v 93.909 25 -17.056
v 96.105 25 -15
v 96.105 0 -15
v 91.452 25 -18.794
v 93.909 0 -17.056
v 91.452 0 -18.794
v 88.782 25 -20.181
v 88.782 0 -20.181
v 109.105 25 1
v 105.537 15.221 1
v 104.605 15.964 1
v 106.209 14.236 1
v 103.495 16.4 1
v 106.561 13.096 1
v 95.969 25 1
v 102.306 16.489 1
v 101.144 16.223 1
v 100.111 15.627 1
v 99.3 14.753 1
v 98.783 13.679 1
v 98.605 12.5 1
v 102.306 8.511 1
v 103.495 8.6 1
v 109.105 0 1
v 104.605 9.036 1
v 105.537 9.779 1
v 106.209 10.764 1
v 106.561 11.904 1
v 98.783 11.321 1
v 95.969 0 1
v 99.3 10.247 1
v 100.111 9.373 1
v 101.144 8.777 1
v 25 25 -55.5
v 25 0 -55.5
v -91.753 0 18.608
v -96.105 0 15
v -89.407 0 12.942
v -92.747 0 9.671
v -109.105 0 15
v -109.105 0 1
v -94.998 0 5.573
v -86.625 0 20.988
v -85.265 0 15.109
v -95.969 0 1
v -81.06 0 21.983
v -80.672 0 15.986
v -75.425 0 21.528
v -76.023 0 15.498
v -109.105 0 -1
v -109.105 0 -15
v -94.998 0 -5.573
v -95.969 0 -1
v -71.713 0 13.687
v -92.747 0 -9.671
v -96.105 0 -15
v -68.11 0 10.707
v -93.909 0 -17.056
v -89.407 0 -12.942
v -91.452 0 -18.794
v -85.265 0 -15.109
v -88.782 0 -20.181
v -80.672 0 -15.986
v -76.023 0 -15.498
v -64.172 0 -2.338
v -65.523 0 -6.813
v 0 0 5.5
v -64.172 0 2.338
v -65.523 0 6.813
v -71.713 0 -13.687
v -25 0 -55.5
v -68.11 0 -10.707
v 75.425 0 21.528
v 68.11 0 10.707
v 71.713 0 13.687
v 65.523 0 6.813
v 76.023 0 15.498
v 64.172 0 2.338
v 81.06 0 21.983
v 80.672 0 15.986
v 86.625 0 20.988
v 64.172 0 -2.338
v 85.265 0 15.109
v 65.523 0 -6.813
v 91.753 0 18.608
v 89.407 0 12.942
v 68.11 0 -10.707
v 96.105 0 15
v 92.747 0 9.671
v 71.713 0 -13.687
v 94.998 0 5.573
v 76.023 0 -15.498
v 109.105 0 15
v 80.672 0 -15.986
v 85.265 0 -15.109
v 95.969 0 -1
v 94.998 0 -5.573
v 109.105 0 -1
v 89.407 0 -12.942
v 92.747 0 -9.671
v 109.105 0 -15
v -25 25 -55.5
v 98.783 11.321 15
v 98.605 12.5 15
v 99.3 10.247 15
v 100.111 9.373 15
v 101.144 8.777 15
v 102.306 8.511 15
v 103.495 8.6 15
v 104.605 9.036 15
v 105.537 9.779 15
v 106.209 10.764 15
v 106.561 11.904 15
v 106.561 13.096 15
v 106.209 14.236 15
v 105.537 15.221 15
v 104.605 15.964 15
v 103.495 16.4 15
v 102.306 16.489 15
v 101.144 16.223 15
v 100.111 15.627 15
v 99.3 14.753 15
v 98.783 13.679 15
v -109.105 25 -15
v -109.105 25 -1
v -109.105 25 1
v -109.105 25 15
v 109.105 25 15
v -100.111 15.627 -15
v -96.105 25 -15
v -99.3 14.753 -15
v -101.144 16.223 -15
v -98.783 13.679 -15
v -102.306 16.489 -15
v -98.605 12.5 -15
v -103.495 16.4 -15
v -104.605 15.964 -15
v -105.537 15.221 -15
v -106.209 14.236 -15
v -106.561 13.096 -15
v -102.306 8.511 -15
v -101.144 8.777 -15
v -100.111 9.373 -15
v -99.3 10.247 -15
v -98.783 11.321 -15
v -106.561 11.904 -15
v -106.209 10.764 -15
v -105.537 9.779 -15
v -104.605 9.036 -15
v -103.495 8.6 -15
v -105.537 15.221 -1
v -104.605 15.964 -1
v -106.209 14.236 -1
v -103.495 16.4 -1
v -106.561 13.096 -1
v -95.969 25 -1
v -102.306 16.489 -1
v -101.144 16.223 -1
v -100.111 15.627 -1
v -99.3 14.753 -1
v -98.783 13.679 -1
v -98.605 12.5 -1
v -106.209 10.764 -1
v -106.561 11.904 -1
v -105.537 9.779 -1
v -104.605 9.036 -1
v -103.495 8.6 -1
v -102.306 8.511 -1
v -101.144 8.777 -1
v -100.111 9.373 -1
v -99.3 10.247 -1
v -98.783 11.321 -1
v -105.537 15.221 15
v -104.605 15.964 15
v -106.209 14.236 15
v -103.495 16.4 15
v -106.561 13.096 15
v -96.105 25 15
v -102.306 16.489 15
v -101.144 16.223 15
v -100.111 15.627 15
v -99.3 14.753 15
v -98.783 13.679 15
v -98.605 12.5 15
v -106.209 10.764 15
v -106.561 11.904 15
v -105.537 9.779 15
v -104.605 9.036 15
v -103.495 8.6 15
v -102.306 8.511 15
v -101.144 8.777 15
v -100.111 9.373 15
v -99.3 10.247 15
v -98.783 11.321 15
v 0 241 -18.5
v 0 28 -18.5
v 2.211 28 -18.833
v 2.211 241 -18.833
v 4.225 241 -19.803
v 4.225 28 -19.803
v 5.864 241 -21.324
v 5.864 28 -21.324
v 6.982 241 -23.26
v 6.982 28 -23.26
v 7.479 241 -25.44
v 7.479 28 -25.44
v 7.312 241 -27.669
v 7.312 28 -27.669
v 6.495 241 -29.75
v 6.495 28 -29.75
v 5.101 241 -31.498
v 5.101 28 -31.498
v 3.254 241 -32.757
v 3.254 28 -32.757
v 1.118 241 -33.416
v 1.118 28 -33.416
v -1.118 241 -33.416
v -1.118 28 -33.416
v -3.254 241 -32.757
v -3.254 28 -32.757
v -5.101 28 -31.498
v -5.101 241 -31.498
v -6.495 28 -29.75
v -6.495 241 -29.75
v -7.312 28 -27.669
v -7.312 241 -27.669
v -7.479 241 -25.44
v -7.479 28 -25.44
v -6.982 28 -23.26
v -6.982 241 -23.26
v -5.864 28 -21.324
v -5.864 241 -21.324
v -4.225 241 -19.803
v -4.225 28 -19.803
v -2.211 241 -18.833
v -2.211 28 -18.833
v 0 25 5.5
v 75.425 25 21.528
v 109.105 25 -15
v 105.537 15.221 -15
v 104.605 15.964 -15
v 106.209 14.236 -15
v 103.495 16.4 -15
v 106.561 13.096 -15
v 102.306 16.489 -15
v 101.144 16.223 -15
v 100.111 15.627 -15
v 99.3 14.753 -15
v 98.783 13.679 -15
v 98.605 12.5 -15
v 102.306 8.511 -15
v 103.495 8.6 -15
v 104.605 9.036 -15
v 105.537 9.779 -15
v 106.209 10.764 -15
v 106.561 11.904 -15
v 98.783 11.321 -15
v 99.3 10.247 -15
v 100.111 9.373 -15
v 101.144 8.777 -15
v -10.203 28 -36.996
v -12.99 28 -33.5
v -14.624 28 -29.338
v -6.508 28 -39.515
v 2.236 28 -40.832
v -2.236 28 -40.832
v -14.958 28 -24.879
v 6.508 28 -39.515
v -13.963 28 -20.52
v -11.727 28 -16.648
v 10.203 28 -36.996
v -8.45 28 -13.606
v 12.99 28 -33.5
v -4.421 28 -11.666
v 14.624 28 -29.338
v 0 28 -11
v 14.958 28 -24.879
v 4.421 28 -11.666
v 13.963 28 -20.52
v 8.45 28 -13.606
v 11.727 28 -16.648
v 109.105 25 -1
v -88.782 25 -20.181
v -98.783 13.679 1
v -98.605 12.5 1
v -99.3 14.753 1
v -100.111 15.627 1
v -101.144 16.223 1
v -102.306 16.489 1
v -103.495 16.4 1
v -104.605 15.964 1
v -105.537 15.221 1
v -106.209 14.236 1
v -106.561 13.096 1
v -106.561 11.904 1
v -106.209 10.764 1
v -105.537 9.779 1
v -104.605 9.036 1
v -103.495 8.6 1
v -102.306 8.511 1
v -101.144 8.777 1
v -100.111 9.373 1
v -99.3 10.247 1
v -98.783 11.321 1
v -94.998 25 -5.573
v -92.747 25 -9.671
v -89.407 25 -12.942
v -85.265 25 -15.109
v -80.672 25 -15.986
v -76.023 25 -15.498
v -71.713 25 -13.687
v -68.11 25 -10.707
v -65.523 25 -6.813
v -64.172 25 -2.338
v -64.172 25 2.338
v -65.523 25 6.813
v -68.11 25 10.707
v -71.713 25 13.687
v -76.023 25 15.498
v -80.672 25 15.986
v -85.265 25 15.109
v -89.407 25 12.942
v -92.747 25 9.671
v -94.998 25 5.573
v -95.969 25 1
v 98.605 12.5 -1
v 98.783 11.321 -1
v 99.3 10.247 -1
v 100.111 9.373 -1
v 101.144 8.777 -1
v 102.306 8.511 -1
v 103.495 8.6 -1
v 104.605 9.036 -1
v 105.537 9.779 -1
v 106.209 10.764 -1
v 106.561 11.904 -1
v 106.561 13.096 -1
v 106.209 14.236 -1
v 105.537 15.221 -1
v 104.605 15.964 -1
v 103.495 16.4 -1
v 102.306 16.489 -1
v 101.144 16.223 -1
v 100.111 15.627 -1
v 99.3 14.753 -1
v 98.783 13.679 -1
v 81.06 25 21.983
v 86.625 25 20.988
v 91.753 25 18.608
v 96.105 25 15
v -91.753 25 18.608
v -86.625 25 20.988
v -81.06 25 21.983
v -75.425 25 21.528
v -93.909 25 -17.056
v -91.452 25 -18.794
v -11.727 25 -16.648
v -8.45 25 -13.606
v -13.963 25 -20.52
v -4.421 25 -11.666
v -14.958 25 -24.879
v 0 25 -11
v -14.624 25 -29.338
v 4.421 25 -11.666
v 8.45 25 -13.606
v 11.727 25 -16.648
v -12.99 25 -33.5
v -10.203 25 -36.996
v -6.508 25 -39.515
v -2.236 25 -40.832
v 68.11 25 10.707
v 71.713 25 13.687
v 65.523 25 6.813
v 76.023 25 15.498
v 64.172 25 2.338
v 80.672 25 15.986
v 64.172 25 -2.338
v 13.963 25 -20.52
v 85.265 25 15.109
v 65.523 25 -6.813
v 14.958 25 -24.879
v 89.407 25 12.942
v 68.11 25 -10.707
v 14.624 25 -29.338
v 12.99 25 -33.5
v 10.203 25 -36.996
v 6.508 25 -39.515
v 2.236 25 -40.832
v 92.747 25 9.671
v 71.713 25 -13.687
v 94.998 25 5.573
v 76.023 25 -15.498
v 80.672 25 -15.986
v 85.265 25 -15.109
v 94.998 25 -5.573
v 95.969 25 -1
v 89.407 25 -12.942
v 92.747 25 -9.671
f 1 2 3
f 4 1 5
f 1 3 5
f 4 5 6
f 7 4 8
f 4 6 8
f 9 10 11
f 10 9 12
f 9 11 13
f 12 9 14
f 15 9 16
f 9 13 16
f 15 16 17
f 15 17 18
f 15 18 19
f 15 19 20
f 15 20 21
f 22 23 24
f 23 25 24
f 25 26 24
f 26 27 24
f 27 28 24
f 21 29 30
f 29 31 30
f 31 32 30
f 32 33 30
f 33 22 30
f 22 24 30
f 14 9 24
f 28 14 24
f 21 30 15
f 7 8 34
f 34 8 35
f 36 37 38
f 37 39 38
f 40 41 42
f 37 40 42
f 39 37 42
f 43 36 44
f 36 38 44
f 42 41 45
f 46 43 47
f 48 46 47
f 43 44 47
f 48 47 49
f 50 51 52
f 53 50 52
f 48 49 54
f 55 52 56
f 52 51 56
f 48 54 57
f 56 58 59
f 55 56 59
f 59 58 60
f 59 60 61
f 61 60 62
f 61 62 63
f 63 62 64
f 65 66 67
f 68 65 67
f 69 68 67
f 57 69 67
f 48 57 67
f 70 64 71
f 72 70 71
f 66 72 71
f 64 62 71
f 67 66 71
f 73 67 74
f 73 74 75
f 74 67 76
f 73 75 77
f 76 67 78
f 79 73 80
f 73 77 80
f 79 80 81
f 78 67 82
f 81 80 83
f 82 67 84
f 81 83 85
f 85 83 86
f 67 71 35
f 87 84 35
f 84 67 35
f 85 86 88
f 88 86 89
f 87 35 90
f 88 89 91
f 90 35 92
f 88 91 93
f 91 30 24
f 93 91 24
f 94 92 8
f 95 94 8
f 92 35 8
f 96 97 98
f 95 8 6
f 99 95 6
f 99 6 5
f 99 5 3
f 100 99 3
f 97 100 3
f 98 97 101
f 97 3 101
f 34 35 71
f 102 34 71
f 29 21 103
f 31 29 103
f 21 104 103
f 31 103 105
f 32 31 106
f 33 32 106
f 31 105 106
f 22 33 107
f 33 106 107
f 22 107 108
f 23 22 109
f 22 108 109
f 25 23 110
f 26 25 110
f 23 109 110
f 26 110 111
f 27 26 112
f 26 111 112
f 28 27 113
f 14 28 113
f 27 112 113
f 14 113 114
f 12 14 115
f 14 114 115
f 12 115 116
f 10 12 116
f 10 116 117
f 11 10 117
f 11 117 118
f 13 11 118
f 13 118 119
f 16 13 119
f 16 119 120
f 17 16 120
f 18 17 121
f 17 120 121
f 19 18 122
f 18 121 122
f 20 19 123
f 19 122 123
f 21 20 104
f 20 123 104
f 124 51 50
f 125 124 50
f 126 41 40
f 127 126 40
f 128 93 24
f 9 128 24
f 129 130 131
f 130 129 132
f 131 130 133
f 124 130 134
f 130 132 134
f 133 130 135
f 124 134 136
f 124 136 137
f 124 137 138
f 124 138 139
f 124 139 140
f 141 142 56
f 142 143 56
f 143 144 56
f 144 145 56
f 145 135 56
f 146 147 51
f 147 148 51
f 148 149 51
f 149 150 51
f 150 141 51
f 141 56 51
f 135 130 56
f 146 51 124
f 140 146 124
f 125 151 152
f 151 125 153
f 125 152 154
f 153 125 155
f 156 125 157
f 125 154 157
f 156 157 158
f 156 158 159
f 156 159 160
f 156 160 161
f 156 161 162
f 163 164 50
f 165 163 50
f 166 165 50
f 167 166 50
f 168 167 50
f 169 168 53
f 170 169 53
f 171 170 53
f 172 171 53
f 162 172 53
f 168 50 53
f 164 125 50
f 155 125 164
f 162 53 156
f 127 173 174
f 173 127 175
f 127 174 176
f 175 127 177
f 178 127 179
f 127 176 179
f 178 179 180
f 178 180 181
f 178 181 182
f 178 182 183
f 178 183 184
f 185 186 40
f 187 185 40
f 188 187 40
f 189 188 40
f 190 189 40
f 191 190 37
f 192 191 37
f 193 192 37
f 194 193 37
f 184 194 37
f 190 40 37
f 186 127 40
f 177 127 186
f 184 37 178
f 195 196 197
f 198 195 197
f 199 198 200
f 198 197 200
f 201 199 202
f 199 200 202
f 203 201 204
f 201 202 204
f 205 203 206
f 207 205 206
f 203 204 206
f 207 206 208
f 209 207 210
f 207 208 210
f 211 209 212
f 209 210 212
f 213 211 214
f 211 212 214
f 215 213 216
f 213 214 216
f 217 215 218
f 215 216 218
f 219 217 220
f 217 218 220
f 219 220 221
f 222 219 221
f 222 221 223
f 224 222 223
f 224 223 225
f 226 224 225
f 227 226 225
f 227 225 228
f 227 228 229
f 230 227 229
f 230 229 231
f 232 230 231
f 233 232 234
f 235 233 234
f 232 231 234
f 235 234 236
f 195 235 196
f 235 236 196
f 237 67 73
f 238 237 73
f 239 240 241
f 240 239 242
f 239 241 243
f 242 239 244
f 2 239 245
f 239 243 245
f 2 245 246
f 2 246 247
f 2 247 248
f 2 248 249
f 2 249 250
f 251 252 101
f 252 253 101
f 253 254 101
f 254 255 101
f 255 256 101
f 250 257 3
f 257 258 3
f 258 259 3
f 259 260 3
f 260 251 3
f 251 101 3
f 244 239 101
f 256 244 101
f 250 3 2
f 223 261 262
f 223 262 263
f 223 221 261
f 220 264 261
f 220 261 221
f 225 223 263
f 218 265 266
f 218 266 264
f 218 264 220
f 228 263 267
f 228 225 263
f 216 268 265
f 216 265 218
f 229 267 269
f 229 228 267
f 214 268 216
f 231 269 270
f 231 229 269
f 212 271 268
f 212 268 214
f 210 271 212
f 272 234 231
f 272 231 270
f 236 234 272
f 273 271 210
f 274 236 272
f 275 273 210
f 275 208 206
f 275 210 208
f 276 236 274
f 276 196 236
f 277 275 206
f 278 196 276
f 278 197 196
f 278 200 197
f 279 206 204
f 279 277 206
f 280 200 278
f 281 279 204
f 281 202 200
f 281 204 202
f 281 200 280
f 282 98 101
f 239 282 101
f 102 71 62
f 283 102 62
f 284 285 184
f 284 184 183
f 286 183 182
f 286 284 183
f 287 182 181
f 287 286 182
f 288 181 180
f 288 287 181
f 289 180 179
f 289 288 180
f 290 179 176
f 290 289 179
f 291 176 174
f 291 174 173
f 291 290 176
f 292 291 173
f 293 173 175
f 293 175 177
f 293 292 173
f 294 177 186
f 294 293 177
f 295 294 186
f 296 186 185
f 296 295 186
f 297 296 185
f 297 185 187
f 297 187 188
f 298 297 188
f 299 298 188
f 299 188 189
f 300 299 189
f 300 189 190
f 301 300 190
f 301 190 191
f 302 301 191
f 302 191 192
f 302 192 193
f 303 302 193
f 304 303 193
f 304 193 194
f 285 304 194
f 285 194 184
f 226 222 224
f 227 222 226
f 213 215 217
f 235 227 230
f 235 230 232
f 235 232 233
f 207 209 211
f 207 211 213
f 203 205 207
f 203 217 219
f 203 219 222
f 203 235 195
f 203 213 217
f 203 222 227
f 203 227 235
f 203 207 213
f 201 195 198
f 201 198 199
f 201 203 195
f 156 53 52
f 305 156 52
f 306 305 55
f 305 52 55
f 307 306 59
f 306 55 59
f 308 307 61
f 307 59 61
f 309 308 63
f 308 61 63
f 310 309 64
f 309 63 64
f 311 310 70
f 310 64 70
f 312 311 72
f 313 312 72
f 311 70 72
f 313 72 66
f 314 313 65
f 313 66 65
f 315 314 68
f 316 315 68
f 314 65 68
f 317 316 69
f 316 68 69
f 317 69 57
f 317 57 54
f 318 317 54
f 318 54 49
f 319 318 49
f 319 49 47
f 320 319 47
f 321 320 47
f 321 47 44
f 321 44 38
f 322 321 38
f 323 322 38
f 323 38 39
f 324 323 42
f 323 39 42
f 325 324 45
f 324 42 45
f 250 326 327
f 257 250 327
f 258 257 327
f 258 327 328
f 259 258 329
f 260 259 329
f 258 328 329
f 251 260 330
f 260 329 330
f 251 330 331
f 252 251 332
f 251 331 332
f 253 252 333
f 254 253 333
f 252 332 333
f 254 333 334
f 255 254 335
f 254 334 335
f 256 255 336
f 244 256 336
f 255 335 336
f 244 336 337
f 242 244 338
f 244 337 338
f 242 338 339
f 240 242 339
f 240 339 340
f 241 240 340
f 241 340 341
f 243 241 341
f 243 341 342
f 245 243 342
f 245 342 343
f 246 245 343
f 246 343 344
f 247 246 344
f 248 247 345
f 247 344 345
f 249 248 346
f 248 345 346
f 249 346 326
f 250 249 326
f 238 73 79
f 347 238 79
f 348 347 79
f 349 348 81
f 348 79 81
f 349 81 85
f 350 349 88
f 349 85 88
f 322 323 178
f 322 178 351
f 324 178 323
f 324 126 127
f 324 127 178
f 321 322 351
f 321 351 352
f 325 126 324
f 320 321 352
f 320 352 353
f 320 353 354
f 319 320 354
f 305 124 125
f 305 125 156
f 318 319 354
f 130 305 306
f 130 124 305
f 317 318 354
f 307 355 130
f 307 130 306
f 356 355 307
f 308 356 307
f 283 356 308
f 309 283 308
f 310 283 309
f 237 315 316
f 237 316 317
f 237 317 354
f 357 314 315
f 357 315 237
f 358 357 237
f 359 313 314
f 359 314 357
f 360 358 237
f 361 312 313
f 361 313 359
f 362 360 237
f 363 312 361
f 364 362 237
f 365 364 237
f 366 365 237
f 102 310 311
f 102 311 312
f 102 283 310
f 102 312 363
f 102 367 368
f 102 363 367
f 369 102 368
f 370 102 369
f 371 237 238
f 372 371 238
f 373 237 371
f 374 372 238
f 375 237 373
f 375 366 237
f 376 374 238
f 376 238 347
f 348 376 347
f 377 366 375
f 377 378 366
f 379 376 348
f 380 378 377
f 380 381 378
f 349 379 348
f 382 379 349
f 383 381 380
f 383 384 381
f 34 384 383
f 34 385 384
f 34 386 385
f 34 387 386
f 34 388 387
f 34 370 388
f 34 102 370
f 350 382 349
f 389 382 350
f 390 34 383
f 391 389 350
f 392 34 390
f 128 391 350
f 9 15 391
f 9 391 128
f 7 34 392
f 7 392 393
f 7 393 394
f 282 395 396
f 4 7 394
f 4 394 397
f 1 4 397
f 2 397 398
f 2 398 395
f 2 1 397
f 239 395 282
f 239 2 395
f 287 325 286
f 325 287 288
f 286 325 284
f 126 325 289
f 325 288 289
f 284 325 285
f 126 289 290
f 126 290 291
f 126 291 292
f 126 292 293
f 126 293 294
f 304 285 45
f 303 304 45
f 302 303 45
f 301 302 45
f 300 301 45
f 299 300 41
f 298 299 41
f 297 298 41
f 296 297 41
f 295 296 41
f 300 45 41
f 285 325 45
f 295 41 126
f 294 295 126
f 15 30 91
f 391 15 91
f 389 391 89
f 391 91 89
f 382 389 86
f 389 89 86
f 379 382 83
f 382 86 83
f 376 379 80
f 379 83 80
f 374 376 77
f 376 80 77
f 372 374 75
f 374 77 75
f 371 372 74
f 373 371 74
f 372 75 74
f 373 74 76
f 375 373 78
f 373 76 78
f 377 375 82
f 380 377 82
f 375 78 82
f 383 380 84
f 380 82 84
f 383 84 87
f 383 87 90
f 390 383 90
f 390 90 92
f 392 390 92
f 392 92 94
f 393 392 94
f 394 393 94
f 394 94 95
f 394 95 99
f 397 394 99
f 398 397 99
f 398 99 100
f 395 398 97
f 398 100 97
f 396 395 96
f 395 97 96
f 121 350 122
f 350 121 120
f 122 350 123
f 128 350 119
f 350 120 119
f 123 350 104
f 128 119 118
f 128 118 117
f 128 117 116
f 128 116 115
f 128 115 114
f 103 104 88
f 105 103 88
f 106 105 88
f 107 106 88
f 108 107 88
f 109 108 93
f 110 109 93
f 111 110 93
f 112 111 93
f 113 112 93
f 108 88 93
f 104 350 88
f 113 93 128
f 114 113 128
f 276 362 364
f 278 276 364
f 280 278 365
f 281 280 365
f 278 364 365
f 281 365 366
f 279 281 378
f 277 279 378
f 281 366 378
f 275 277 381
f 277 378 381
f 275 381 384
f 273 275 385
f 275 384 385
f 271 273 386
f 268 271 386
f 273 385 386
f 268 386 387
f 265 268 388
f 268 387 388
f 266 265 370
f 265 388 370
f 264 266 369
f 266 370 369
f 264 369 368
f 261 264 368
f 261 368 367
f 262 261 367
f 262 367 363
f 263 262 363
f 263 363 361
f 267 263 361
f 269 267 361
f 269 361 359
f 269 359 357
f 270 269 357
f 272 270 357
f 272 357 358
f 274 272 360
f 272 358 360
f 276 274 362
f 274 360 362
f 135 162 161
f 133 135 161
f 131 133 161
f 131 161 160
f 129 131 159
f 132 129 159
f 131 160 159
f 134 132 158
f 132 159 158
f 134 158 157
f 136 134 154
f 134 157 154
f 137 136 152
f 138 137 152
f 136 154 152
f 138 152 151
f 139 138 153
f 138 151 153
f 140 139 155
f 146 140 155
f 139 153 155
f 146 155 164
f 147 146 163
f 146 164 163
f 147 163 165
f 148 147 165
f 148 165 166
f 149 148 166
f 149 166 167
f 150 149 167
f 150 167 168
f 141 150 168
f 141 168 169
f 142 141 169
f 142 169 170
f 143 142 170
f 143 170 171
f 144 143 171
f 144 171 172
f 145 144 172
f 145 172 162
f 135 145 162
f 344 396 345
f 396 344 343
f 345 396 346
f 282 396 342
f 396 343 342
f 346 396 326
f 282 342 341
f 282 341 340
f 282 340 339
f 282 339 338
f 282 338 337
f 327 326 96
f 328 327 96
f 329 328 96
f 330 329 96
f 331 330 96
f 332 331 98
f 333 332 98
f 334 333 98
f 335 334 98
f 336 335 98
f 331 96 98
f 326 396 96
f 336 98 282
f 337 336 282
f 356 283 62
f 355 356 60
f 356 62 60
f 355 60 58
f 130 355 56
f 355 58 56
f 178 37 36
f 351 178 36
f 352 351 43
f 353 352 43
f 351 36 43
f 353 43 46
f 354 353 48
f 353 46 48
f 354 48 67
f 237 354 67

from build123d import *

# Parameters (mm, degrees)
BOSS_EXTRUDE1_DEPTH = 25
SKETCH3_R           = 4
CUT_EXTRUDE1_DEPTH  = 15
SKETCH4_R           = 15
BOSS_EXTRUDE2_DEPTH = 3
SKETCH5_R           = 7.5
BOSS_EXTRUDE3_DEPTH = 213


with BuildPart() as part:
    # Sketch1 → Boss-Extrude1 (new body)
    with BuildSketch(Plane(origin=(0, 0, 0), x_dir=(1, 0, 0), z_dir=(0, 1, 0))):
        with BuildLine():
            Line((-25, 55.5), (-88.782047704, 20.180509757))
            ThreePointArc((-88.782047704, 20.180509757), (-92.710355788, 17.967308971), (-96.105195929, 15))
            Line((-96.105195929, 15), (-109.105195929, 15))
            Line((-109.105195929, 15), (-109.105195929, 1))
            Line((-109.105195929, 1), (-95.968719423, 1))
            ThreePointArc((-95.968719423, 1), (-64, 0), (-95.968719423, -1))
            Line((-95.968719423, -1), (-109.105195929, -1))
            Line((-109.105195929, -1), (-109.105195929, -15))
            Line((-109.105195929, -15), (-96.105195929, -15))
            ThreePointArc((-96.105195929, -15), (-86.625068957, -20.987753506), (-75.425325161, -21.527881597))
            Line((-75.425325161, -21.527881597), (0, -5.5))
            Line((0, -5.5), (75.425325161, -21.527881597))
            ThreePointArc((75.425325161, -21.527881597), (86.625068957, -20.987753506), (96.105195929, -15))
            Line((96.105195929, -15), (109.105195929, -15))
            Line((109.105195929, -15), (109.105195929, -1))
            Line((109.105195929, -1), (95.968719423, -1))
            ThreePointArc((95.968719423, -1), (64, 0), (95.968719423, 1))
            Line((95.968719423, 1), (109.105195929, 1))
            Line((109.105195929, 1), (109.105195929, 15))
            Line((109.105195929, 15), (96.105195929, 15))
            ThreePointArc((96.105195929, 15), (92.710355788, 17.967308971), (88.782047704, 20.180509757))
            Line((88.782047704, 20.180509757), (25, 55.5))
            Line((25, 55.5), (1, 55.5))
            Line((1, 55.5), (-1, 55.5))
            Line((-1, 55.5), (-25, 55.5))
        make_face()
    extrude(amount=BOSS_EXTRUDE1_DEPTH)

    # Sketch3 → Cut-Extrude1 (cut, symmetric)
    with BuildSketch(Plane.XY):
        with Locations((-102.605195929, 12.5)):
            Circle(SKETCH3_R)
        with Locations(Location((102.605195929, 12.5, 0), (0, 0, 180))):
            Circle(SKETCH3_R)
    extrude(amount=CUT_EXTRUDE1_DEPTH, both=True, mode=Mode.SUBTRACT)

    # Sketch4 → Boss-Extrude2 (add)
    with BuildSketch(Plane(origin=(0, 25, 0), x_dir=(1, 0, 0), z_dir=(0, 1, 0))):
        with Locations(Location((0, 26, 0), (0, 0, 270))):
            Circle(SKETCH4_R)
    extrude(amount=BOSS_EXTRUDE2_DEPTH)

    # Sketch5 → Boss-Extrude3 (add)
    with BuildSketch(Plane(origin=(0, 28, 0), x_dir=(1, 0, 0), z_dir=(0, 1, 0))):
        with Locations(Location((0, 26, 0), (0, 0, 270))):
            Circle(SKETCH5_R)
    extrude(amount=BOSS_EXTRUDE3_DEPTH)


solid = part.part
